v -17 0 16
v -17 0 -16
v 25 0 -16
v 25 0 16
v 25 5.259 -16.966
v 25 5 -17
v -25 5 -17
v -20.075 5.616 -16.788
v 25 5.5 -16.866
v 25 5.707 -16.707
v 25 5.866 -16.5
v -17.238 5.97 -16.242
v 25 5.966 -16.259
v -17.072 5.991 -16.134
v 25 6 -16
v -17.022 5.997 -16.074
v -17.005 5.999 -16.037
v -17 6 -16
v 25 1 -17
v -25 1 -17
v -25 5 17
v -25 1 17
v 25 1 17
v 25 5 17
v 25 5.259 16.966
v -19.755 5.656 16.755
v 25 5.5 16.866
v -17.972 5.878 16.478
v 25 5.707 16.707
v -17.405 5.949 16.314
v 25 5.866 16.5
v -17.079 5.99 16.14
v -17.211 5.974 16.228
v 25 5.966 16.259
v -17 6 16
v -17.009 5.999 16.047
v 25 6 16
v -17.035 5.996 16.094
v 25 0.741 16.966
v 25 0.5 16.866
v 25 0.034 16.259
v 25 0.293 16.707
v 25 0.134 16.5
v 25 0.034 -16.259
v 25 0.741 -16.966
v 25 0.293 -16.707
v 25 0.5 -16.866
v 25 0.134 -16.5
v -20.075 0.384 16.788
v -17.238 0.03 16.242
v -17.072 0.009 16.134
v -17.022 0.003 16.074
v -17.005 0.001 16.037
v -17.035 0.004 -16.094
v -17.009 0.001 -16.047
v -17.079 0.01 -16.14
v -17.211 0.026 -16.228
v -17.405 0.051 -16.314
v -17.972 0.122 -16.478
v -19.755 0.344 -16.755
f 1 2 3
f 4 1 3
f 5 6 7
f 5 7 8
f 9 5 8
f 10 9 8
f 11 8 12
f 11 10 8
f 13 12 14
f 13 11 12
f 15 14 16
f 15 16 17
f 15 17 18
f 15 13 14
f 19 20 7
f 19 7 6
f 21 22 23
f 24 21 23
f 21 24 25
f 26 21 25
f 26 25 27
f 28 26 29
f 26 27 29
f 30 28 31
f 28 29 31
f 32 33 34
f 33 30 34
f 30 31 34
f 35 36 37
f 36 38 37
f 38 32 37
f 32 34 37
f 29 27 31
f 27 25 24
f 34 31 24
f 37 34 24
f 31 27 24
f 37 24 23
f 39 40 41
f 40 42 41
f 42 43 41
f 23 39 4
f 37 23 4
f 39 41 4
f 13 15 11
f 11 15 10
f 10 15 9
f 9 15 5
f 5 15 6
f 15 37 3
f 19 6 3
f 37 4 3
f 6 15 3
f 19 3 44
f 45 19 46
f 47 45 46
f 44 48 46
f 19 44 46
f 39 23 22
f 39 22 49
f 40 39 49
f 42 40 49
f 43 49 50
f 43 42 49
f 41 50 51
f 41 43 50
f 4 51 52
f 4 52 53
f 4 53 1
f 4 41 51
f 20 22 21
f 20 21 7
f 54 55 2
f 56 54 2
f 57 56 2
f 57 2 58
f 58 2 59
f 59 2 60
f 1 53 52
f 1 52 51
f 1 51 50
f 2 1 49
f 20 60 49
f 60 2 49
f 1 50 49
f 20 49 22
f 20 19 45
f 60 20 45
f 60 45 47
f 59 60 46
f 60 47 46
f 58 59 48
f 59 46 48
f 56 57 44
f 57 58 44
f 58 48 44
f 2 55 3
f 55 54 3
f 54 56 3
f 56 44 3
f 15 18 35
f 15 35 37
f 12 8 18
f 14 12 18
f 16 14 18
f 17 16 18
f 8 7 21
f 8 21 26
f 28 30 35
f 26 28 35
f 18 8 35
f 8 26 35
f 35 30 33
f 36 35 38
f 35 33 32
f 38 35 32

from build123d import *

# Parameters (mm, degrees)
SKETCH_1_W          = 50
SKETCH_1_H          = 34
EXTRUDE_1_DEPTH     = 6
FILLET_1_R          = 1
CUT_EXTRUDE_1_DEPTH = 40


with BuildPart() as part:
    # 草图1 → 凸台-拉伸1 (new body)
    with BuildSketch(Plane(origin=(0, 0, 0), x_dir=(1, 0, 0), z_dir=(0, 1, 0))):
        Rectangle(SKETCH_1_W, SKETCH_1_H)
    extrude(amount=EXTRUDE_1_DEPTH)

    # 圆角1
    fillet_1_edges = [part.edges().sort_by_distance(p)[0] for p in [
        (0, 6, 17),
        (0, 0, 17),
        (0, 0, -17),
        (0, 6, -17),
    ]]
    fillet(fillet_1_edges, radius=FILLET_1_R)

    # 草图2 → 切除-拉伸1 (cut)
    with BuildSketch(Plane.XY.offset(17)):
        Polygon((-25, 5), (-17, 6), (-17, 8), (-27, 8), (-27, -2), (-17, -2), (-17, 0), (-25, 1), align=None)
    extrude(amount=-CUT_EXTRUDE_1_DEPTH, mode=Mode.SUBTRACT)


solid = part.part
